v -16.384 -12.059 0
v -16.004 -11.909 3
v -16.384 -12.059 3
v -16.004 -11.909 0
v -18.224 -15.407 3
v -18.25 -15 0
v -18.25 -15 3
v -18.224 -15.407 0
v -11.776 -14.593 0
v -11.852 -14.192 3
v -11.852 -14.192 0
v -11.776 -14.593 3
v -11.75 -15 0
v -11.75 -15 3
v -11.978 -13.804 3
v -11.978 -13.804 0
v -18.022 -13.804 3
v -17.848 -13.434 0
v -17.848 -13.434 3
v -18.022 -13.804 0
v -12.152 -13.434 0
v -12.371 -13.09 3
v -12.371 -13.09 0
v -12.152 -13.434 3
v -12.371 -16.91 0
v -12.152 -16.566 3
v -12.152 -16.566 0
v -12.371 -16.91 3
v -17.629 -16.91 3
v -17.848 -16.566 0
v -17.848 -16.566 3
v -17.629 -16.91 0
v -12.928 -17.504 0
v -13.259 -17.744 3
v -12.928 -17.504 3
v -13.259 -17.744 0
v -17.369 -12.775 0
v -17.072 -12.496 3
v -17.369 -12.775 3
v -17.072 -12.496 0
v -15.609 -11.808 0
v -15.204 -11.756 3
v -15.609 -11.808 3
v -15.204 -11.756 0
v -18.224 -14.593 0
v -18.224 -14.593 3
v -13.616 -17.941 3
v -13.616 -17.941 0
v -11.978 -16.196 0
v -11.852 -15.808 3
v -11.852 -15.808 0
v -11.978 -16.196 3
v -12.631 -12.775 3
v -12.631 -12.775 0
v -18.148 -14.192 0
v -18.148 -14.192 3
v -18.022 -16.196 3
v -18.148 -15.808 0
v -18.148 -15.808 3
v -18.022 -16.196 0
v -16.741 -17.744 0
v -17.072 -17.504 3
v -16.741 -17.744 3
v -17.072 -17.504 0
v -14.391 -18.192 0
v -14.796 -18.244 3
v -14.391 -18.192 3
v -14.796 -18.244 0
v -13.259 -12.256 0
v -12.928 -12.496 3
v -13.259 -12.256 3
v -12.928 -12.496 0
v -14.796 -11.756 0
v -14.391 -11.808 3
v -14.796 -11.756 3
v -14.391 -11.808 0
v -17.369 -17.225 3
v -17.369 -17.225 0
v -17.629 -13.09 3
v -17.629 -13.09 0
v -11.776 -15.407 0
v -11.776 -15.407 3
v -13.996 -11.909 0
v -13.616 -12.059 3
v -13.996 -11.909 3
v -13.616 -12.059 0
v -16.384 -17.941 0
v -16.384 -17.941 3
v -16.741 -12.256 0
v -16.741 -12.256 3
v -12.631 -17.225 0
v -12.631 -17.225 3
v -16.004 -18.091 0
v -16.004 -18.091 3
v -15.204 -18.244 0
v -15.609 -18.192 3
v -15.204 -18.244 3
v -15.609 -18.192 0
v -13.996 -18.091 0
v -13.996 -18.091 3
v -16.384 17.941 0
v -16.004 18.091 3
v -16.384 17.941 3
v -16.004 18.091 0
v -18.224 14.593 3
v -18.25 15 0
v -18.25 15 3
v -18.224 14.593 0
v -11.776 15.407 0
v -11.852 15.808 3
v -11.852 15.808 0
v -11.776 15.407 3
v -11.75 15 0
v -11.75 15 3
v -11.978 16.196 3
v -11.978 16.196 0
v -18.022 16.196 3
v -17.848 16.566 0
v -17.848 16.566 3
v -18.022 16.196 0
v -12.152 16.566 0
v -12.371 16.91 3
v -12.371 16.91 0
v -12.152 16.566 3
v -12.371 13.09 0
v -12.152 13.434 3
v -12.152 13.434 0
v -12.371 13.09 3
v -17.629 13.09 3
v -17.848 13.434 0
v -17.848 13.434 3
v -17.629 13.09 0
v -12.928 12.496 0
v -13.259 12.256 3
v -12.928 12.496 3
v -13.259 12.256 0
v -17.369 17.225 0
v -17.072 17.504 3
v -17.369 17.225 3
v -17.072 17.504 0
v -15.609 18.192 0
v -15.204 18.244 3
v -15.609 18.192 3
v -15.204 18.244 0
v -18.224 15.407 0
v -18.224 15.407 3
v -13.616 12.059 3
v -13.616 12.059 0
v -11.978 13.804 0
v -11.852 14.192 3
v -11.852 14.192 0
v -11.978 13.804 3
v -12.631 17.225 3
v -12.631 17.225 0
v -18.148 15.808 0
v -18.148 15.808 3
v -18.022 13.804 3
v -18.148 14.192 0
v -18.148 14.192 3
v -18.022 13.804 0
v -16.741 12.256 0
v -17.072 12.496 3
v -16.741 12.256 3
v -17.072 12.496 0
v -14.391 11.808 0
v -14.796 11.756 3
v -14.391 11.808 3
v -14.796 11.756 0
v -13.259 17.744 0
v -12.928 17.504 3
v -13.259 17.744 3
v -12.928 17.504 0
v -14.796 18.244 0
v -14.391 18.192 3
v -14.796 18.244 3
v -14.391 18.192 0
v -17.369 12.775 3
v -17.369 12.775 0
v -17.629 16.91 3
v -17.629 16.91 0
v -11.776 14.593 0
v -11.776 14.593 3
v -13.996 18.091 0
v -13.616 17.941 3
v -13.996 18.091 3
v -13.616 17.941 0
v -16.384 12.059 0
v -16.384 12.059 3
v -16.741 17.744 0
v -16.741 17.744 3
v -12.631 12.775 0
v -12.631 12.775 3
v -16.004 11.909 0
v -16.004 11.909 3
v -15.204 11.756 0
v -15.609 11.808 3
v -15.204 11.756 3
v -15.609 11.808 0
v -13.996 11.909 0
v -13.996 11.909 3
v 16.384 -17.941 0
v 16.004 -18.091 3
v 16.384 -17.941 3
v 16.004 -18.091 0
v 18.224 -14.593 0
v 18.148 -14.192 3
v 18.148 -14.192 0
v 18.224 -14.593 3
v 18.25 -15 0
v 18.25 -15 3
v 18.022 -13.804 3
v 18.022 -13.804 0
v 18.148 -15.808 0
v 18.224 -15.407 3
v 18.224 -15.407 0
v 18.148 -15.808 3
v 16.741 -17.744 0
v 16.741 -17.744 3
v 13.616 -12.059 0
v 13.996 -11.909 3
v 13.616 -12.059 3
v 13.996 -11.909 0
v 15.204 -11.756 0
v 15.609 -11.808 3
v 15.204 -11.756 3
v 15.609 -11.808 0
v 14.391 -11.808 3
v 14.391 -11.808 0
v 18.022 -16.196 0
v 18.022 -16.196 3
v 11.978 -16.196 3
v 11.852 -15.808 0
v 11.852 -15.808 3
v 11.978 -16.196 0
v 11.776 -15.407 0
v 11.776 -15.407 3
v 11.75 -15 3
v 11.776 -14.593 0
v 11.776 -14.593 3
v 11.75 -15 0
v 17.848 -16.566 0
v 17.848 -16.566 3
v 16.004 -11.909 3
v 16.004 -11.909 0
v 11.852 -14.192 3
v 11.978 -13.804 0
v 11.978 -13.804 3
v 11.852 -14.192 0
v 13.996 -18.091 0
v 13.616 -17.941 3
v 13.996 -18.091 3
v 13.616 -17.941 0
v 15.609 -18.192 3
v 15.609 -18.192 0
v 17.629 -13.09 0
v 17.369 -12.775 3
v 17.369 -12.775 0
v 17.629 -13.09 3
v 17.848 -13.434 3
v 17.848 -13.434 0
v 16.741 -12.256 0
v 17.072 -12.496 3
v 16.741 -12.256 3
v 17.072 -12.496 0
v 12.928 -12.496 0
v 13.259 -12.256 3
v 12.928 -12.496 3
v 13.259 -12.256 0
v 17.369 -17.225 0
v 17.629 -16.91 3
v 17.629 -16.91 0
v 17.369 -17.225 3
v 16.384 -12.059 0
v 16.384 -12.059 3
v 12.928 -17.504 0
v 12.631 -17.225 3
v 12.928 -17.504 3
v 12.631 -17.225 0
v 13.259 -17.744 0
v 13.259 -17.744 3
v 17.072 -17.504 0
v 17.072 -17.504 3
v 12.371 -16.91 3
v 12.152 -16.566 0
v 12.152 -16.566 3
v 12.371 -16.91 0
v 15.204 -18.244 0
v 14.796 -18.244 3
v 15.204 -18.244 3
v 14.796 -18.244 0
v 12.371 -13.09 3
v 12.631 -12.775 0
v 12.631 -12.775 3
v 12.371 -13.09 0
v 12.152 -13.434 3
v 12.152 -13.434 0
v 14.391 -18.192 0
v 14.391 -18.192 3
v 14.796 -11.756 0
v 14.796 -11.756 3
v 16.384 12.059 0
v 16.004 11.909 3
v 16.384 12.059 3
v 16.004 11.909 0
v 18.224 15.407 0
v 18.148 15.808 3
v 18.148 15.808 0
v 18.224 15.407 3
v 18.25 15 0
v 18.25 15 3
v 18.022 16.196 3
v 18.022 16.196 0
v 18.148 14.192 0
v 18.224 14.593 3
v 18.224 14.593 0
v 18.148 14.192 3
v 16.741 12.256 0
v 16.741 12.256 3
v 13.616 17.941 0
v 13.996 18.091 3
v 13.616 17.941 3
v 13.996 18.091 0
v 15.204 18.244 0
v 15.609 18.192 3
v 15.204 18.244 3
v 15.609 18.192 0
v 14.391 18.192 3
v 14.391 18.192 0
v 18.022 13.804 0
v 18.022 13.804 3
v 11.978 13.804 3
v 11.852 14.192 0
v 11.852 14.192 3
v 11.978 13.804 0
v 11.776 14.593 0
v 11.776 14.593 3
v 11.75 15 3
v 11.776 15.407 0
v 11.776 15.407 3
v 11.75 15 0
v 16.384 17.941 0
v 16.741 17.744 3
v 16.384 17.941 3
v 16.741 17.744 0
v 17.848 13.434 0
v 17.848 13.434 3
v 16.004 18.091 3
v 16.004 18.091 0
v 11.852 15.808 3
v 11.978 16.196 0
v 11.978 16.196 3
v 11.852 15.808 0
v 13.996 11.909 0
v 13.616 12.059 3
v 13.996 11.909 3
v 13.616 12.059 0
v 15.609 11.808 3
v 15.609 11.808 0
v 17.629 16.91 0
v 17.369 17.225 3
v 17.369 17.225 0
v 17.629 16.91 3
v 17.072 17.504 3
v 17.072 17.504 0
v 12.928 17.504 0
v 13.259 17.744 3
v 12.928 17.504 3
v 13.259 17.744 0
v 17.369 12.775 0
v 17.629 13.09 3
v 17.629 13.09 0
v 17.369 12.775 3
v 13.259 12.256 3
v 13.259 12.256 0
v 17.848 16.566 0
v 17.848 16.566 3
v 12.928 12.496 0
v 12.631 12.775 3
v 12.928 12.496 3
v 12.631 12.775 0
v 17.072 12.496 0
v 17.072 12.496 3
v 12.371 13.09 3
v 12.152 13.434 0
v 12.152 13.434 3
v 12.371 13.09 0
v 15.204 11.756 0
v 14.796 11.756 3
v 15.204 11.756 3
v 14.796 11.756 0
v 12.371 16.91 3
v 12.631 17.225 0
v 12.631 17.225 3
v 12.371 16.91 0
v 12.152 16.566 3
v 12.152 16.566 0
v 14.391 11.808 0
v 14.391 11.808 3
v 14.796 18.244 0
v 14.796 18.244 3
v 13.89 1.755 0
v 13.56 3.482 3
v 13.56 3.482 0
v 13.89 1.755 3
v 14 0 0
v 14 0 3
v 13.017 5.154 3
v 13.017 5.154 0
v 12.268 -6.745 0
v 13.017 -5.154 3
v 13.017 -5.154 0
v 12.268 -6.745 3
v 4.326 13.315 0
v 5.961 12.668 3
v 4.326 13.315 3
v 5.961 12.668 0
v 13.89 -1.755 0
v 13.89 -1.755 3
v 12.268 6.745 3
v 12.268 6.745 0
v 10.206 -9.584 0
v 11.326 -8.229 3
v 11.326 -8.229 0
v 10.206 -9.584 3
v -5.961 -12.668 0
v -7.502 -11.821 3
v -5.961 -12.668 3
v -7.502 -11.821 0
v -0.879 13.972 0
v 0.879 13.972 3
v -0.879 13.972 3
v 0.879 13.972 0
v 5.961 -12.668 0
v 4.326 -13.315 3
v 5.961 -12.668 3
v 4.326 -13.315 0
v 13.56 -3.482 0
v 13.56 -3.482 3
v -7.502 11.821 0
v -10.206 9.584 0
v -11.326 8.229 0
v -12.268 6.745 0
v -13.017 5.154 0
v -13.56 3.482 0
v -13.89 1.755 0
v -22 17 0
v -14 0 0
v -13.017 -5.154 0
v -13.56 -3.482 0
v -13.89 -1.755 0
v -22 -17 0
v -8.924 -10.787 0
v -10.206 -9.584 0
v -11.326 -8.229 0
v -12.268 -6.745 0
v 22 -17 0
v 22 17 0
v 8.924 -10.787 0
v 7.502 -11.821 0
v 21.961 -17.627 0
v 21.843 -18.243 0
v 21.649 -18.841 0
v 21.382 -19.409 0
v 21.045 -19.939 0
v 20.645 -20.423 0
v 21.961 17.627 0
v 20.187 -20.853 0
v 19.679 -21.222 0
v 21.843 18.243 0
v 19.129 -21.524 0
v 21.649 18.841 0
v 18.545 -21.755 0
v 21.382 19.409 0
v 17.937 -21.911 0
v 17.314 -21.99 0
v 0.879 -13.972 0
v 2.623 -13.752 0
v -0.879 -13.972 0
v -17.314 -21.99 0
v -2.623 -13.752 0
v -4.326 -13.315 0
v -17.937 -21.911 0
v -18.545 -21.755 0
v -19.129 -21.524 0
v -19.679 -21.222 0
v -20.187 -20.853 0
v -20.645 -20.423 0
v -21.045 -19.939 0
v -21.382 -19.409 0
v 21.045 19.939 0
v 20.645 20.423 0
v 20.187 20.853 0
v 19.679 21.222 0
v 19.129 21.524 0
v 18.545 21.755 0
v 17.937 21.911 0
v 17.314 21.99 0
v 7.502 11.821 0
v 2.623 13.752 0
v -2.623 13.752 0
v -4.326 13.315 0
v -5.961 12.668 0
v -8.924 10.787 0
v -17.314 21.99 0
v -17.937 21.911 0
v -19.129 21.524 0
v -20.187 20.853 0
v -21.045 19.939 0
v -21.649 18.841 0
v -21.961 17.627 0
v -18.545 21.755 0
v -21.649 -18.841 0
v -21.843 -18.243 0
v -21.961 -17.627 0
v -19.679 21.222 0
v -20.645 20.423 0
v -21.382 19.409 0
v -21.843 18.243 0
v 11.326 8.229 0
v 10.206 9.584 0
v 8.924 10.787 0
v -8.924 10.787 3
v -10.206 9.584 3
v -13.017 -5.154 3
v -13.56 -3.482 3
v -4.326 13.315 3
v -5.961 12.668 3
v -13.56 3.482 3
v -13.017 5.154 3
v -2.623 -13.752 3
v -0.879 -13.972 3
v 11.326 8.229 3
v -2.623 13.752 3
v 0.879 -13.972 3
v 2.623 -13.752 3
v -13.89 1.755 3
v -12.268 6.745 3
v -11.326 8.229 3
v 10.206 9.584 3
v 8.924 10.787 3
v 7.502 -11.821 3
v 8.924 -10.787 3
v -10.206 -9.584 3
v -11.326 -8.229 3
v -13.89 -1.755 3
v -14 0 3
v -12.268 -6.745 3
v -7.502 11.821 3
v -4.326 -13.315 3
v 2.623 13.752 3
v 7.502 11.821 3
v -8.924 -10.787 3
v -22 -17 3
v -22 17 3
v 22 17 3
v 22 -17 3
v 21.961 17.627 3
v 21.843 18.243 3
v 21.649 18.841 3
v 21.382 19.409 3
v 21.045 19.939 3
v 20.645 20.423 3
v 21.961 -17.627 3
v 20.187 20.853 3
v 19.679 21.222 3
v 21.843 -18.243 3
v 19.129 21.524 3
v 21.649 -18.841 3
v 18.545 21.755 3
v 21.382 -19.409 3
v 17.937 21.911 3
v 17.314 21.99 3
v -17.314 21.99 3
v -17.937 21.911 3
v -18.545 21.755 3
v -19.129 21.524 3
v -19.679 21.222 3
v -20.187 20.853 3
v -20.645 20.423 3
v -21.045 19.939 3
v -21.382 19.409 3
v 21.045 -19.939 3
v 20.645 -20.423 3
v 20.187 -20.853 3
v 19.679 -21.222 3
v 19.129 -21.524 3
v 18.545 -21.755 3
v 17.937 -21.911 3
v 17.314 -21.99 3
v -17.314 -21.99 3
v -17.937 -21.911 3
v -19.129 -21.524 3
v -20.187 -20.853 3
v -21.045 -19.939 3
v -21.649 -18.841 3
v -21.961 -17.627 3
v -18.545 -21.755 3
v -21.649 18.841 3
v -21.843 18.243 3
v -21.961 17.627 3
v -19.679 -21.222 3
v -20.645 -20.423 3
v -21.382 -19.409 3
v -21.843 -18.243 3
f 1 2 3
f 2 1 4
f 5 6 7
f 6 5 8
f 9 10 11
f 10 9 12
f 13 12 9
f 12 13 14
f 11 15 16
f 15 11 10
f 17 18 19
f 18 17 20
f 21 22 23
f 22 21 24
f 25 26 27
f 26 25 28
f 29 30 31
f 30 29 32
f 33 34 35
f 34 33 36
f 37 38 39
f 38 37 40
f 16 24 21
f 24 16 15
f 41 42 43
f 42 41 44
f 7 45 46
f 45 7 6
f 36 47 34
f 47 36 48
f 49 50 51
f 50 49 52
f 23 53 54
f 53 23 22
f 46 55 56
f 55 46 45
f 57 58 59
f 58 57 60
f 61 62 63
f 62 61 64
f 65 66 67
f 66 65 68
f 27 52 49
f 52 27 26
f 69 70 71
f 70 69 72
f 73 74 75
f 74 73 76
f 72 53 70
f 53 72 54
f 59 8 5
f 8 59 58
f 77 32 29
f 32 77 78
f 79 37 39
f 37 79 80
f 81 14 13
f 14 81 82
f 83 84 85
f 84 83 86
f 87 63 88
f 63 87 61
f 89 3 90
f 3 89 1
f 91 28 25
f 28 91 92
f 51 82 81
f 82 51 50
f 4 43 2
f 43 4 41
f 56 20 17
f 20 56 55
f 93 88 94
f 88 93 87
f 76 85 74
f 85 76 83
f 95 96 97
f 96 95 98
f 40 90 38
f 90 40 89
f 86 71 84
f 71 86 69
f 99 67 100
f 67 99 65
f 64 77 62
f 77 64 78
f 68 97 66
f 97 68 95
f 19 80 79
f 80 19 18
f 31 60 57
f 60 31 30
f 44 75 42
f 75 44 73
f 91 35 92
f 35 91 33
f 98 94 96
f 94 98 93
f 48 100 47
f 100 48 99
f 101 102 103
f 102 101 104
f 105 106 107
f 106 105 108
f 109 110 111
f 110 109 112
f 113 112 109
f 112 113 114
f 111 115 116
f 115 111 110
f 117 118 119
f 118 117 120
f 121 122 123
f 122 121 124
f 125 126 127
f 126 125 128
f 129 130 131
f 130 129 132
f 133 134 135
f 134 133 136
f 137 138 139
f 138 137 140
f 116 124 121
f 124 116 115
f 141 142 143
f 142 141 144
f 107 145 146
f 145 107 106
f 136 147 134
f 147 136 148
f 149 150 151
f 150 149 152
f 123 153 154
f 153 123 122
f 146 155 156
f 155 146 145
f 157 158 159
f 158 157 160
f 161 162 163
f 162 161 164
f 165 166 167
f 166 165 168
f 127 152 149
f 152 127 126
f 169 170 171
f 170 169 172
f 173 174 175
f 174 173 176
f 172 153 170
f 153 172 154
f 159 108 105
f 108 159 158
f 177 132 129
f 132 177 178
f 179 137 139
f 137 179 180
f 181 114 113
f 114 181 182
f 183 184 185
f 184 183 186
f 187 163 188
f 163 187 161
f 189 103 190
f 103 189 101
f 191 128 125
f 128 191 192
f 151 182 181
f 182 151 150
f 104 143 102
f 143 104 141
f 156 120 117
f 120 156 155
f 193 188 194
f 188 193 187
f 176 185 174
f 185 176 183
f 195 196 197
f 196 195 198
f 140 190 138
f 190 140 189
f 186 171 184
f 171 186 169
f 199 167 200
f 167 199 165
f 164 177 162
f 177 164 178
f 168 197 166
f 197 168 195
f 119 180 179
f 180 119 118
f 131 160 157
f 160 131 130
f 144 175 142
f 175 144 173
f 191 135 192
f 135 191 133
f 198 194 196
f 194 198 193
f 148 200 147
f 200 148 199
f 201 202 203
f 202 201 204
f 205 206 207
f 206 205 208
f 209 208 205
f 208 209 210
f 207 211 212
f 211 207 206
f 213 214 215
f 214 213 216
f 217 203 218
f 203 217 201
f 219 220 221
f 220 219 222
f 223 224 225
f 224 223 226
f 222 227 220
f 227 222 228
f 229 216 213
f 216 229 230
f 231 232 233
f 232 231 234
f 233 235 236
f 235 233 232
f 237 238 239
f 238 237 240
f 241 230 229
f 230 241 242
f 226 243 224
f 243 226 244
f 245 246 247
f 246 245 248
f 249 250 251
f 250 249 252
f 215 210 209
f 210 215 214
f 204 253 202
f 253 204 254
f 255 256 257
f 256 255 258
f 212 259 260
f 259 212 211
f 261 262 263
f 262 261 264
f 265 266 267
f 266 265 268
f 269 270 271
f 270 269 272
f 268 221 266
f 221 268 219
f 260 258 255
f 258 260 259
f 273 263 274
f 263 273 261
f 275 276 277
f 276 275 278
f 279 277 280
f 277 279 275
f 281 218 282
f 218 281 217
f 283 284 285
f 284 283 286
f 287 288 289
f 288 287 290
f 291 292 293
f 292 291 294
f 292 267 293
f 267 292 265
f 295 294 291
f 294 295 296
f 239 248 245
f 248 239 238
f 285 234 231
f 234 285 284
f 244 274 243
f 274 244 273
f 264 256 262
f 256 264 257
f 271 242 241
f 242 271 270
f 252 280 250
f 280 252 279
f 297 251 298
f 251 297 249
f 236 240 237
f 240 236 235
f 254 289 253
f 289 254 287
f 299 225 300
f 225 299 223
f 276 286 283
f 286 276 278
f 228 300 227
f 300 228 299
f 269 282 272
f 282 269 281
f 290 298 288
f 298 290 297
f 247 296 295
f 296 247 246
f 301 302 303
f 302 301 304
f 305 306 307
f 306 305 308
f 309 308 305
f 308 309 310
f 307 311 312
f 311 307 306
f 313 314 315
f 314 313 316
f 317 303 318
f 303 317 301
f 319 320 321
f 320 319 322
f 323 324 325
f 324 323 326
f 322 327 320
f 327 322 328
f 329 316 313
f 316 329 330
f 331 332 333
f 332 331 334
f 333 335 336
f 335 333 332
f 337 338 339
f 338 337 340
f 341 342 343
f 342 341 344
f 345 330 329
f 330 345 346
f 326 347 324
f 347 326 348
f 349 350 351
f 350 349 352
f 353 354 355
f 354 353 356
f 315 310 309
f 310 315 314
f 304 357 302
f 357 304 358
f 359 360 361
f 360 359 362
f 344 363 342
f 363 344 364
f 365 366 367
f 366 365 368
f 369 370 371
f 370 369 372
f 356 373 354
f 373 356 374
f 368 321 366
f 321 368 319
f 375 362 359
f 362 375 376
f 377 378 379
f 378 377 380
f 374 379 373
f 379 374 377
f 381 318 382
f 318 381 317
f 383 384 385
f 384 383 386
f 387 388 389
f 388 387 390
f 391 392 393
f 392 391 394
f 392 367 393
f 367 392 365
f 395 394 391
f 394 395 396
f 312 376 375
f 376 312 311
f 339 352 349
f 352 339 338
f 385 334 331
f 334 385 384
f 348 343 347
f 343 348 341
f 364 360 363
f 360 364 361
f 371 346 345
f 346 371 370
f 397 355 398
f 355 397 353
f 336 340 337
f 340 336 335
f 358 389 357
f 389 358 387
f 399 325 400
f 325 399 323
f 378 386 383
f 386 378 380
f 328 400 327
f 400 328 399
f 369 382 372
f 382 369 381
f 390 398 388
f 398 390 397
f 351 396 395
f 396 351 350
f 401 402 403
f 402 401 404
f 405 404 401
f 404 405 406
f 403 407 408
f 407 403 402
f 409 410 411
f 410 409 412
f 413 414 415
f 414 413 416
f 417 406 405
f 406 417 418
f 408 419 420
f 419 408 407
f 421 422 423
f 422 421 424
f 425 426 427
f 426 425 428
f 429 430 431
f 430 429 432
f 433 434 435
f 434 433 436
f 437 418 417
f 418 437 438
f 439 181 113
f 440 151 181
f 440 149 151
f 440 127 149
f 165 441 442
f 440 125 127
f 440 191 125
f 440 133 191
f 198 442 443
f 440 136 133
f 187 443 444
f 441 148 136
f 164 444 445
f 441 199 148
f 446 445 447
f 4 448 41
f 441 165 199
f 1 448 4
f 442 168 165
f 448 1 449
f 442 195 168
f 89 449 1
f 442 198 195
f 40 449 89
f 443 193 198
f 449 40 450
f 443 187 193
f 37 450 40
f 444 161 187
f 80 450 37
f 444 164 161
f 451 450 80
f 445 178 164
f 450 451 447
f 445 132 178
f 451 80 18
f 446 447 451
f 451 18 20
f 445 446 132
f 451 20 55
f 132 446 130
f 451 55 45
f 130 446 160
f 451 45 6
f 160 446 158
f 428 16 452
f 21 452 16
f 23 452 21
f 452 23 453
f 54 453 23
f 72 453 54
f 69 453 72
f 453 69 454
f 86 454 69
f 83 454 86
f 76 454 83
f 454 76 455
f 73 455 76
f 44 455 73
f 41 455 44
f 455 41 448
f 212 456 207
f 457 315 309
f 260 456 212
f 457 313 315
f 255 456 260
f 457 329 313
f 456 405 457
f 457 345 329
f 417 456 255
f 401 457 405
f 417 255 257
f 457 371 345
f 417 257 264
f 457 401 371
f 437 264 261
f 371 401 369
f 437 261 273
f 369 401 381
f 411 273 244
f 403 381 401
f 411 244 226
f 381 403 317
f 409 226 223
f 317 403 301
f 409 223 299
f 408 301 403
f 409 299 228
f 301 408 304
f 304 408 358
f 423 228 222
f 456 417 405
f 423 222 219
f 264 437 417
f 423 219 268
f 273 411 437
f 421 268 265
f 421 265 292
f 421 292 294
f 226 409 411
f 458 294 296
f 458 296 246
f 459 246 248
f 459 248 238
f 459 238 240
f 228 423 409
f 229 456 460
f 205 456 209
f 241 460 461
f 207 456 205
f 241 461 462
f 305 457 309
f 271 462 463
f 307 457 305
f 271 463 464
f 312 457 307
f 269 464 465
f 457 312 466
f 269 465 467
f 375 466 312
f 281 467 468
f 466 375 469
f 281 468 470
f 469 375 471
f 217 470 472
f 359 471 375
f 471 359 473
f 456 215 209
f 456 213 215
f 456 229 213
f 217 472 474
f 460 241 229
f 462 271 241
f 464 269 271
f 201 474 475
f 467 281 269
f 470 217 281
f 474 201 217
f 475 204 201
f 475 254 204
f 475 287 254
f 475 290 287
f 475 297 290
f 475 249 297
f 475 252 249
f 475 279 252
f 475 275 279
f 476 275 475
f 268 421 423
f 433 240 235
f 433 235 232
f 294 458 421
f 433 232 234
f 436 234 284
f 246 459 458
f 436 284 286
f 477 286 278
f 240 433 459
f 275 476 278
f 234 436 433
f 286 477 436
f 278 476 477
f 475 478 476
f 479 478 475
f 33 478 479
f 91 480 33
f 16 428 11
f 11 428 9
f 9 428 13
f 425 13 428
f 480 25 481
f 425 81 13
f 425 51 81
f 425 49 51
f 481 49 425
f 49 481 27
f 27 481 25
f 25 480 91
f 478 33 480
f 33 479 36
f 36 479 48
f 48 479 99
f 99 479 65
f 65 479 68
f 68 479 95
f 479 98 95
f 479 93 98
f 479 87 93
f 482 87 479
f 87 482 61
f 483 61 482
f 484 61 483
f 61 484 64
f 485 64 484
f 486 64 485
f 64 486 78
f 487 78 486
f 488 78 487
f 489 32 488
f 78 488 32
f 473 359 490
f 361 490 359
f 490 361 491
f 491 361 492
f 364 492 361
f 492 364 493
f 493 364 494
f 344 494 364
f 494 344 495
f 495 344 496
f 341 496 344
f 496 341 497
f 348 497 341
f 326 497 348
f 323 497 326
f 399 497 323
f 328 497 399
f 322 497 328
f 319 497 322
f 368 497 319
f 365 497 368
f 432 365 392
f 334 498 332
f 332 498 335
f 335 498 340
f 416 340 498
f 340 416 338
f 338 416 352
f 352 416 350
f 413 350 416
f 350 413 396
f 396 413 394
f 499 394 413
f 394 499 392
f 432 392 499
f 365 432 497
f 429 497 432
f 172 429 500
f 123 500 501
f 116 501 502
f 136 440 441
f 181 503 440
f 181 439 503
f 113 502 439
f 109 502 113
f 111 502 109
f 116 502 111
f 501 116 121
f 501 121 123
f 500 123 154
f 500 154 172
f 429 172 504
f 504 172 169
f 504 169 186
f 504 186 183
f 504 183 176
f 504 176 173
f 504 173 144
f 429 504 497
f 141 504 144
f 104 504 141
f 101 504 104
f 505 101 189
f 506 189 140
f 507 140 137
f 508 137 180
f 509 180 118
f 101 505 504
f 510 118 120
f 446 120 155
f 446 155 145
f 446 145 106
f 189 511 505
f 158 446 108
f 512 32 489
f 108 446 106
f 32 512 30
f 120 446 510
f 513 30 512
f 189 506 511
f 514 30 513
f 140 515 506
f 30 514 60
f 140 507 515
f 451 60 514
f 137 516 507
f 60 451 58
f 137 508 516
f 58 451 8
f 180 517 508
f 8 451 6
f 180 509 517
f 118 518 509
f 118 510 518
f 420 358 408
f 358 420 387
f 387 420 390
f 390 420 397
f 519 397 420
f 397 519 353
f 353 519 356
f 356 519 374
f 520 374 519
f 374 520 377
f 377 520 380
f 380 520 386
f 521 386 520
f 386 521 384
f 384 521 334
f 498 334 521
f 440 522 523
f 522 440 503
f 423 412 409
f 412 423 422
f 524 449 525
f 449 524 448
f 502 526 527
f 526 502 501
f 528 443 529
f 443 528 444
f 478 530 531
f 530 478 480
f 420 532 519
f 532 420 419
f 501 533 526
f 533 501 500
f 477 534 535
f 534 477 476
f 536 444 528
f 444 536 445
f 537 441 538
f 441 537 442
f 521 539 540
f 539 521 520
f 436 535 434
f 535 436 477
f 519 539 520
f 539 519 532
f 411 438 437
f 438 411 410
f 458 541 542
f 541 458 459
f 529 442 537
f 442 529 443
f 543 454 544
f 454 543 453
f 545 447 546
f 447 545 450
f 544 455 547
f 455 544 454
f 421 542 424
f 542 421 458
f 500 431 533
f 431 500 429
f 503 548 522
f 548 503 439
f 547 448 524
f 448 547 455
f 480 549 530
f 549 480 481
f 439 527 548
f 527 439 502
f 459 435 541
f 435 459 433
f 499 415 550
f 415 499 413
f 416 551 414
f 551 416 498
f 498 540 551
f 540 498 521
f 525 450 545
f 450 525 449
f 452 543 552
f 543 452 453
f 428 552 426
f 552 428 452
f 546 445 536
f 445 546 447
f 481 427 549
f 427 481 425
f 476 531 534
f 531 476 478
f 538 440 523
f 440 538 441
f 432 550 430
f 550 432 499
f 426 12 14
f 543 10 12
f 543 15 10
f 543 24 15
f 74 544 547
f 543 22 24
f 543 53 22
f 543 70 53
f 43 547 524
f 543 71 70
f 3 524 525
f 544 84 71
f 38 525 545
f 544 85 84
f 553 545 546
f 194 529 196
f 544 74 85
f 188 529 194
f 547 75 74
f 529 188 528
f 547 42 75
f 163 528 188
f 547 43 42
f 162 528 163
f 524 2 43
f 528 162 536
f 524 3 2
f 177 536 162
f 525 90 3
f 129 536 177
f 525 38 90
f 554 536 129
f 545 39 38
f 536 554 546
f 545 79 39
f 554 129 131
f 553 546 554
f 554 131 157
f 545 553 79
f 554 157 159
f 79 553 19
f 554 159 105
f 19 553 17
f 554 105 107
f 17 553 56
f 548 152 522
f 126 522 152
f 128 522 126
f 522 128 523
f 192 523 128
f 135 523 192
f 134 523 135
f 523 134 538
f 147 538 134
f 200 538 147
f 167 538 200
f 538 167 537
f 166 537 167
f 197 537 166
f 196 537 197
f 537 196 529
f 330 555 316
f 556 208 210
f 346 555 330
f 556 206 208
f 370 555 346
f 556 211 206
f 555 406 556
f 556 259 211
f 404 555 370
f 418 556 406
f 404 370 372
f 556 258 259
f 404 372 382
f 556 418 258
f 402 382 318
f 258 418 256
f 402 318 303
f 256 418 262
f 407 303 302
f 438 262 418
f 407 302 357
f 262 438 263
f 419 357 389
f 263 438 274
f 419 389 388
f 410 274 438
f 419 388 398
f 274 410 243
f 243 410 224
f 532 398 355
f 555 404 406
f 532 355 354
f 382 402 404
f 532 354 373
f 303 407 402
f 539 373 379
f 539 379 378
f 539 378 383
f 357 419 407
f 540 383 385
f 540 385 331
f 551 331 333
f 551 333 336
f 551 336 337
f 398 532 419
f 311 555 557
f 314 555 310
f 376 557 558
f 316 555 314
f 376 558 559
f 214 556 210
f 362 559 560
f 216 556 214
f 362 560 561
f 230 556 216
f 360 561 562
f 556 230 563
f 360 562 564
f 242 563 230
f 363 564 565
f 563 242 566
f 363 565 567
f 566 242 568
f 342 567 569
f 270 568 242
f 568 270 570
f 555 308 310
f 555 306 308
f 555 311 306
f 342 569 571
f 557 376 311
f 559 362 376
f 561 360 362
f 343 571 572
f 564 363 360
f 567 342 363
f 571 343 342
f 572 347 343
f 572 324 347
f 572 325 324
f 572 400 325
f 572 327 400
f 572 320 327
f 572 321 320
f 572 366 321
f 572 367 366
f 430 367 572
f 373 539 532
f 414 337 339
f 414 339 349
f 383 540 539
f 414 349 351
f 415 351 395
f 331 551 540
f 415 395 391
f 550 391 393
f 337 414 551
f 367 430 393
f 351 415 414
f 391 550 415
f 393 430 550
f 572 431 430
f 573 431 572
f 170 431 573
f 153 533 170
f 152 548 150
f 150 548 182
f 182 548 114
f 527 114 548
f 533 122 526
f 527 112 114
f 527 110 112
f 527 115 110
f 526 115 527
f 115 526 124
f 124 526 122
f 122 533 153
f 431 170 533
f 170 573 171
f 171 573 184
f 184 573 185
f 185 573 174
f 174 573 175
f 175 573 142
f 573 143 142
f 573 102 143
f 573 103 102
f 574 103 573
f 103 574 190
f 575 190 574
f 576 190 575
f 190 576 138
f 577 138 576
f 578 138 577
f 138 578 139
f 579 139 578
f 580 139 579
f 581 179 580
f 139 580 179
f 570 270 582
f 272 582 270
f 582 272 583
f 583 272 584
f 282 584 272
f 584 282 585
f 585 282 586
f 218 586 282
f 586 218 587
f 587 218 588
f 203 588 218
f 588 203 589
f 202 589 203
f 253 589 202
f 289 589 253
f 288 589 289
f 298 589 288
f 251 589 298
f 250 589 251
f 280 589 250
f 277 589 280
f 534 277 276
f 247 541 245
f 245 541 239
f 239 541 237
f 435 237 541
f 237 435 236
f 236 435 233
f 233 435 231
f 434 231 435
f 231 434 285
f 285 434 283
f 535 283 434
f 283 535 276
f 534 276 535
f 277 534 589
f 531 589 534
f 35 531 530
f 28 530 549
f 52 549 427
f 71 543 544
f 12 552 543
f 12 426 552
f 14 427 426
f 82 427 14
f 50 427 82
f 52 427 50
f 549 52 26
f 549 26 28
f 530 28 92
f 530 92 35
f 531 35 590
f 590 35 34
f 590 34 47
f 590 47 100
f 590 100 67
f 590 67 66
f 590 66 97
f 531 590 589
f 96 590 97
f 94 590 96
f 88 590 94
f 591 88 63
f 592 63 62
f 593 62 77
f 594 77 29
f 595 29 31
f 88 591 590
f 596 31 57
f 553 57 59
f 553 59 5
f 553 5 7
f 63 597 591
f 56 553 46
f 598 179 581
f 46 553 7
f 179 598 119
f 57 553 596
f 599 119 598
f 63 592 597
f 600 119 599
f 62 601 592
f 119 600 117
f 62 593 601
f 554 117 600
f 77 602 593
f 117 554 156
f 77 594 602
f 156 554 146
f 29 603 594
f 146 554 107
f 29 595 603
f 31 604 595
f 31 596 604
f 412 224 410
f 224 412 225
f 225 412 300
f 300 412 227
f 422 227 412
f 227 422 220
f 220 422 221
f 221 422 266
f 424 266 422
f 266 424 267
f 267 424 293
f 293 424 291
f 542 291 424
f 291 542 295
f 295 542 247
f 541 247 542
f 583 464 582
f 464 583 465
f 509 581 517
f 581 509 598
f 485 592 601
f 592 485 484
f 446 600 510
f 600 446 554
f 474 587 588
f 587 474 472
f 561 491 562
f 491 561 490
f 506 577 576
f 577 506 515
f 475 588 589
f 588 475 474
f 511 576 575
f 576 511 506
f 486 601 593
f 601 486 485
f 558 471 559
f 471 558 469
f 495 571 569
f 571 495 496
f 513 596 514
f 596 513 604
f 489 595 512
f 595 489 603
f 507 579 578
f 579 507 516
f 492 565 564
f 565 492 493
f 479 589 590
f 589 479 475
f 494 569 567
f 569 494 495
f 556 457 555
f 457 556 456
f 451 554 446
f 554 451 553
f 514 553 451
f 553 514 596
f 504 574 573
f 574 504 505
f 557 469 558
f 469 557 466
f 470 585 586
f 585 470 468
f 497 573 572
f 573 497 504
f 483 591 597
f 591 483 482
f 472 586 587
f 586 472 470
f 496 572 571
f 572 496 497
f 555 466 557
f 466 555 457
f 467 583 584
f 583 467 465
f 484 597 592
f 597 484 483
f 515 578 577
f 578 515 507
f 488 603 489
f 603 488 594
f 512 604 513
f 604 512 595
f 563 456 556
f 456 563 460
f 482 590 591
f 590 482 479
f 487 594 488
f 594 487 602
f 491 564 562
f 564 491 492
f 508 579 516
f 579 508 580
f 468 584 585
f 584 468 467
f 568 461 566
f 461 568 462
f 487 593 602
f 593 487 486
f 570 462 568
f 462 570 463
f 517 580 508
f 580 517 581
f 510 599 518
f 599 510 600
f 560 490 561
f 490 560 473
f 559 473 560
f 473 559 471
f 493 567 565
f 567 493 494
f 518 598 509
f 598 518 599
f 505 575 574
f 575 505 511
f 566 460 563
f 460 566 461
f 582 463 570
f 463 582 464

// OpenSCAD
$fn = 50;

difference() {
	union() {
		hull() {
			translate(v = [-17.0, 17.0, 0]) {
				cylinder(h = 3, r = 5);
			}
			translate(v = [17.0, 17.0, 0]) {
				cylinder(h = 3, r = 5);
			}
			translate(v = [-17.0, -17.0, 0]) {
				cylinder(h = 3, r = 5);
			}
			translate(v = [17.0, -17.0, 0]) {
				cylinder(h = 3, r = 5);
			}
		}
	}
	union() {
		translate(v = [-15.0, -15.0, -100.0]) {
			cylinder(h = 200, r = 3.25);
		}
		translate(v = [-15.0, 15.0, -100.0]) {
			cylinder(h = 200, r = 3.25);
		}
		translate(v = [15.0, -15.0, -100.0]) {
			cylinder(h = 200, r = 3.25);
		}
		translate(v = [15.0, 15.0, -100.0]) {
			cylinder(h = 200, r = 3.25);
		}
		translate(v = [-15.0, -15.0, -100.0]) {
			cylinder(h = 200, r = 1.8);
		}
		translate(v = [-15.0, 15.0, -100.0]) {
			cylinder(h = 200, r = 1.8);
		}
		translate(v = [15.0, -15.0, -100.0]) {
			cylinder(h = 200, r = 1.8);
		}
		translate(v = [15.0, 15.0, -100.0]) {
			cylinder(h = 200, r = 1.8);
		}
		cylinder(h = 3, r = 14.0);
	}
}
